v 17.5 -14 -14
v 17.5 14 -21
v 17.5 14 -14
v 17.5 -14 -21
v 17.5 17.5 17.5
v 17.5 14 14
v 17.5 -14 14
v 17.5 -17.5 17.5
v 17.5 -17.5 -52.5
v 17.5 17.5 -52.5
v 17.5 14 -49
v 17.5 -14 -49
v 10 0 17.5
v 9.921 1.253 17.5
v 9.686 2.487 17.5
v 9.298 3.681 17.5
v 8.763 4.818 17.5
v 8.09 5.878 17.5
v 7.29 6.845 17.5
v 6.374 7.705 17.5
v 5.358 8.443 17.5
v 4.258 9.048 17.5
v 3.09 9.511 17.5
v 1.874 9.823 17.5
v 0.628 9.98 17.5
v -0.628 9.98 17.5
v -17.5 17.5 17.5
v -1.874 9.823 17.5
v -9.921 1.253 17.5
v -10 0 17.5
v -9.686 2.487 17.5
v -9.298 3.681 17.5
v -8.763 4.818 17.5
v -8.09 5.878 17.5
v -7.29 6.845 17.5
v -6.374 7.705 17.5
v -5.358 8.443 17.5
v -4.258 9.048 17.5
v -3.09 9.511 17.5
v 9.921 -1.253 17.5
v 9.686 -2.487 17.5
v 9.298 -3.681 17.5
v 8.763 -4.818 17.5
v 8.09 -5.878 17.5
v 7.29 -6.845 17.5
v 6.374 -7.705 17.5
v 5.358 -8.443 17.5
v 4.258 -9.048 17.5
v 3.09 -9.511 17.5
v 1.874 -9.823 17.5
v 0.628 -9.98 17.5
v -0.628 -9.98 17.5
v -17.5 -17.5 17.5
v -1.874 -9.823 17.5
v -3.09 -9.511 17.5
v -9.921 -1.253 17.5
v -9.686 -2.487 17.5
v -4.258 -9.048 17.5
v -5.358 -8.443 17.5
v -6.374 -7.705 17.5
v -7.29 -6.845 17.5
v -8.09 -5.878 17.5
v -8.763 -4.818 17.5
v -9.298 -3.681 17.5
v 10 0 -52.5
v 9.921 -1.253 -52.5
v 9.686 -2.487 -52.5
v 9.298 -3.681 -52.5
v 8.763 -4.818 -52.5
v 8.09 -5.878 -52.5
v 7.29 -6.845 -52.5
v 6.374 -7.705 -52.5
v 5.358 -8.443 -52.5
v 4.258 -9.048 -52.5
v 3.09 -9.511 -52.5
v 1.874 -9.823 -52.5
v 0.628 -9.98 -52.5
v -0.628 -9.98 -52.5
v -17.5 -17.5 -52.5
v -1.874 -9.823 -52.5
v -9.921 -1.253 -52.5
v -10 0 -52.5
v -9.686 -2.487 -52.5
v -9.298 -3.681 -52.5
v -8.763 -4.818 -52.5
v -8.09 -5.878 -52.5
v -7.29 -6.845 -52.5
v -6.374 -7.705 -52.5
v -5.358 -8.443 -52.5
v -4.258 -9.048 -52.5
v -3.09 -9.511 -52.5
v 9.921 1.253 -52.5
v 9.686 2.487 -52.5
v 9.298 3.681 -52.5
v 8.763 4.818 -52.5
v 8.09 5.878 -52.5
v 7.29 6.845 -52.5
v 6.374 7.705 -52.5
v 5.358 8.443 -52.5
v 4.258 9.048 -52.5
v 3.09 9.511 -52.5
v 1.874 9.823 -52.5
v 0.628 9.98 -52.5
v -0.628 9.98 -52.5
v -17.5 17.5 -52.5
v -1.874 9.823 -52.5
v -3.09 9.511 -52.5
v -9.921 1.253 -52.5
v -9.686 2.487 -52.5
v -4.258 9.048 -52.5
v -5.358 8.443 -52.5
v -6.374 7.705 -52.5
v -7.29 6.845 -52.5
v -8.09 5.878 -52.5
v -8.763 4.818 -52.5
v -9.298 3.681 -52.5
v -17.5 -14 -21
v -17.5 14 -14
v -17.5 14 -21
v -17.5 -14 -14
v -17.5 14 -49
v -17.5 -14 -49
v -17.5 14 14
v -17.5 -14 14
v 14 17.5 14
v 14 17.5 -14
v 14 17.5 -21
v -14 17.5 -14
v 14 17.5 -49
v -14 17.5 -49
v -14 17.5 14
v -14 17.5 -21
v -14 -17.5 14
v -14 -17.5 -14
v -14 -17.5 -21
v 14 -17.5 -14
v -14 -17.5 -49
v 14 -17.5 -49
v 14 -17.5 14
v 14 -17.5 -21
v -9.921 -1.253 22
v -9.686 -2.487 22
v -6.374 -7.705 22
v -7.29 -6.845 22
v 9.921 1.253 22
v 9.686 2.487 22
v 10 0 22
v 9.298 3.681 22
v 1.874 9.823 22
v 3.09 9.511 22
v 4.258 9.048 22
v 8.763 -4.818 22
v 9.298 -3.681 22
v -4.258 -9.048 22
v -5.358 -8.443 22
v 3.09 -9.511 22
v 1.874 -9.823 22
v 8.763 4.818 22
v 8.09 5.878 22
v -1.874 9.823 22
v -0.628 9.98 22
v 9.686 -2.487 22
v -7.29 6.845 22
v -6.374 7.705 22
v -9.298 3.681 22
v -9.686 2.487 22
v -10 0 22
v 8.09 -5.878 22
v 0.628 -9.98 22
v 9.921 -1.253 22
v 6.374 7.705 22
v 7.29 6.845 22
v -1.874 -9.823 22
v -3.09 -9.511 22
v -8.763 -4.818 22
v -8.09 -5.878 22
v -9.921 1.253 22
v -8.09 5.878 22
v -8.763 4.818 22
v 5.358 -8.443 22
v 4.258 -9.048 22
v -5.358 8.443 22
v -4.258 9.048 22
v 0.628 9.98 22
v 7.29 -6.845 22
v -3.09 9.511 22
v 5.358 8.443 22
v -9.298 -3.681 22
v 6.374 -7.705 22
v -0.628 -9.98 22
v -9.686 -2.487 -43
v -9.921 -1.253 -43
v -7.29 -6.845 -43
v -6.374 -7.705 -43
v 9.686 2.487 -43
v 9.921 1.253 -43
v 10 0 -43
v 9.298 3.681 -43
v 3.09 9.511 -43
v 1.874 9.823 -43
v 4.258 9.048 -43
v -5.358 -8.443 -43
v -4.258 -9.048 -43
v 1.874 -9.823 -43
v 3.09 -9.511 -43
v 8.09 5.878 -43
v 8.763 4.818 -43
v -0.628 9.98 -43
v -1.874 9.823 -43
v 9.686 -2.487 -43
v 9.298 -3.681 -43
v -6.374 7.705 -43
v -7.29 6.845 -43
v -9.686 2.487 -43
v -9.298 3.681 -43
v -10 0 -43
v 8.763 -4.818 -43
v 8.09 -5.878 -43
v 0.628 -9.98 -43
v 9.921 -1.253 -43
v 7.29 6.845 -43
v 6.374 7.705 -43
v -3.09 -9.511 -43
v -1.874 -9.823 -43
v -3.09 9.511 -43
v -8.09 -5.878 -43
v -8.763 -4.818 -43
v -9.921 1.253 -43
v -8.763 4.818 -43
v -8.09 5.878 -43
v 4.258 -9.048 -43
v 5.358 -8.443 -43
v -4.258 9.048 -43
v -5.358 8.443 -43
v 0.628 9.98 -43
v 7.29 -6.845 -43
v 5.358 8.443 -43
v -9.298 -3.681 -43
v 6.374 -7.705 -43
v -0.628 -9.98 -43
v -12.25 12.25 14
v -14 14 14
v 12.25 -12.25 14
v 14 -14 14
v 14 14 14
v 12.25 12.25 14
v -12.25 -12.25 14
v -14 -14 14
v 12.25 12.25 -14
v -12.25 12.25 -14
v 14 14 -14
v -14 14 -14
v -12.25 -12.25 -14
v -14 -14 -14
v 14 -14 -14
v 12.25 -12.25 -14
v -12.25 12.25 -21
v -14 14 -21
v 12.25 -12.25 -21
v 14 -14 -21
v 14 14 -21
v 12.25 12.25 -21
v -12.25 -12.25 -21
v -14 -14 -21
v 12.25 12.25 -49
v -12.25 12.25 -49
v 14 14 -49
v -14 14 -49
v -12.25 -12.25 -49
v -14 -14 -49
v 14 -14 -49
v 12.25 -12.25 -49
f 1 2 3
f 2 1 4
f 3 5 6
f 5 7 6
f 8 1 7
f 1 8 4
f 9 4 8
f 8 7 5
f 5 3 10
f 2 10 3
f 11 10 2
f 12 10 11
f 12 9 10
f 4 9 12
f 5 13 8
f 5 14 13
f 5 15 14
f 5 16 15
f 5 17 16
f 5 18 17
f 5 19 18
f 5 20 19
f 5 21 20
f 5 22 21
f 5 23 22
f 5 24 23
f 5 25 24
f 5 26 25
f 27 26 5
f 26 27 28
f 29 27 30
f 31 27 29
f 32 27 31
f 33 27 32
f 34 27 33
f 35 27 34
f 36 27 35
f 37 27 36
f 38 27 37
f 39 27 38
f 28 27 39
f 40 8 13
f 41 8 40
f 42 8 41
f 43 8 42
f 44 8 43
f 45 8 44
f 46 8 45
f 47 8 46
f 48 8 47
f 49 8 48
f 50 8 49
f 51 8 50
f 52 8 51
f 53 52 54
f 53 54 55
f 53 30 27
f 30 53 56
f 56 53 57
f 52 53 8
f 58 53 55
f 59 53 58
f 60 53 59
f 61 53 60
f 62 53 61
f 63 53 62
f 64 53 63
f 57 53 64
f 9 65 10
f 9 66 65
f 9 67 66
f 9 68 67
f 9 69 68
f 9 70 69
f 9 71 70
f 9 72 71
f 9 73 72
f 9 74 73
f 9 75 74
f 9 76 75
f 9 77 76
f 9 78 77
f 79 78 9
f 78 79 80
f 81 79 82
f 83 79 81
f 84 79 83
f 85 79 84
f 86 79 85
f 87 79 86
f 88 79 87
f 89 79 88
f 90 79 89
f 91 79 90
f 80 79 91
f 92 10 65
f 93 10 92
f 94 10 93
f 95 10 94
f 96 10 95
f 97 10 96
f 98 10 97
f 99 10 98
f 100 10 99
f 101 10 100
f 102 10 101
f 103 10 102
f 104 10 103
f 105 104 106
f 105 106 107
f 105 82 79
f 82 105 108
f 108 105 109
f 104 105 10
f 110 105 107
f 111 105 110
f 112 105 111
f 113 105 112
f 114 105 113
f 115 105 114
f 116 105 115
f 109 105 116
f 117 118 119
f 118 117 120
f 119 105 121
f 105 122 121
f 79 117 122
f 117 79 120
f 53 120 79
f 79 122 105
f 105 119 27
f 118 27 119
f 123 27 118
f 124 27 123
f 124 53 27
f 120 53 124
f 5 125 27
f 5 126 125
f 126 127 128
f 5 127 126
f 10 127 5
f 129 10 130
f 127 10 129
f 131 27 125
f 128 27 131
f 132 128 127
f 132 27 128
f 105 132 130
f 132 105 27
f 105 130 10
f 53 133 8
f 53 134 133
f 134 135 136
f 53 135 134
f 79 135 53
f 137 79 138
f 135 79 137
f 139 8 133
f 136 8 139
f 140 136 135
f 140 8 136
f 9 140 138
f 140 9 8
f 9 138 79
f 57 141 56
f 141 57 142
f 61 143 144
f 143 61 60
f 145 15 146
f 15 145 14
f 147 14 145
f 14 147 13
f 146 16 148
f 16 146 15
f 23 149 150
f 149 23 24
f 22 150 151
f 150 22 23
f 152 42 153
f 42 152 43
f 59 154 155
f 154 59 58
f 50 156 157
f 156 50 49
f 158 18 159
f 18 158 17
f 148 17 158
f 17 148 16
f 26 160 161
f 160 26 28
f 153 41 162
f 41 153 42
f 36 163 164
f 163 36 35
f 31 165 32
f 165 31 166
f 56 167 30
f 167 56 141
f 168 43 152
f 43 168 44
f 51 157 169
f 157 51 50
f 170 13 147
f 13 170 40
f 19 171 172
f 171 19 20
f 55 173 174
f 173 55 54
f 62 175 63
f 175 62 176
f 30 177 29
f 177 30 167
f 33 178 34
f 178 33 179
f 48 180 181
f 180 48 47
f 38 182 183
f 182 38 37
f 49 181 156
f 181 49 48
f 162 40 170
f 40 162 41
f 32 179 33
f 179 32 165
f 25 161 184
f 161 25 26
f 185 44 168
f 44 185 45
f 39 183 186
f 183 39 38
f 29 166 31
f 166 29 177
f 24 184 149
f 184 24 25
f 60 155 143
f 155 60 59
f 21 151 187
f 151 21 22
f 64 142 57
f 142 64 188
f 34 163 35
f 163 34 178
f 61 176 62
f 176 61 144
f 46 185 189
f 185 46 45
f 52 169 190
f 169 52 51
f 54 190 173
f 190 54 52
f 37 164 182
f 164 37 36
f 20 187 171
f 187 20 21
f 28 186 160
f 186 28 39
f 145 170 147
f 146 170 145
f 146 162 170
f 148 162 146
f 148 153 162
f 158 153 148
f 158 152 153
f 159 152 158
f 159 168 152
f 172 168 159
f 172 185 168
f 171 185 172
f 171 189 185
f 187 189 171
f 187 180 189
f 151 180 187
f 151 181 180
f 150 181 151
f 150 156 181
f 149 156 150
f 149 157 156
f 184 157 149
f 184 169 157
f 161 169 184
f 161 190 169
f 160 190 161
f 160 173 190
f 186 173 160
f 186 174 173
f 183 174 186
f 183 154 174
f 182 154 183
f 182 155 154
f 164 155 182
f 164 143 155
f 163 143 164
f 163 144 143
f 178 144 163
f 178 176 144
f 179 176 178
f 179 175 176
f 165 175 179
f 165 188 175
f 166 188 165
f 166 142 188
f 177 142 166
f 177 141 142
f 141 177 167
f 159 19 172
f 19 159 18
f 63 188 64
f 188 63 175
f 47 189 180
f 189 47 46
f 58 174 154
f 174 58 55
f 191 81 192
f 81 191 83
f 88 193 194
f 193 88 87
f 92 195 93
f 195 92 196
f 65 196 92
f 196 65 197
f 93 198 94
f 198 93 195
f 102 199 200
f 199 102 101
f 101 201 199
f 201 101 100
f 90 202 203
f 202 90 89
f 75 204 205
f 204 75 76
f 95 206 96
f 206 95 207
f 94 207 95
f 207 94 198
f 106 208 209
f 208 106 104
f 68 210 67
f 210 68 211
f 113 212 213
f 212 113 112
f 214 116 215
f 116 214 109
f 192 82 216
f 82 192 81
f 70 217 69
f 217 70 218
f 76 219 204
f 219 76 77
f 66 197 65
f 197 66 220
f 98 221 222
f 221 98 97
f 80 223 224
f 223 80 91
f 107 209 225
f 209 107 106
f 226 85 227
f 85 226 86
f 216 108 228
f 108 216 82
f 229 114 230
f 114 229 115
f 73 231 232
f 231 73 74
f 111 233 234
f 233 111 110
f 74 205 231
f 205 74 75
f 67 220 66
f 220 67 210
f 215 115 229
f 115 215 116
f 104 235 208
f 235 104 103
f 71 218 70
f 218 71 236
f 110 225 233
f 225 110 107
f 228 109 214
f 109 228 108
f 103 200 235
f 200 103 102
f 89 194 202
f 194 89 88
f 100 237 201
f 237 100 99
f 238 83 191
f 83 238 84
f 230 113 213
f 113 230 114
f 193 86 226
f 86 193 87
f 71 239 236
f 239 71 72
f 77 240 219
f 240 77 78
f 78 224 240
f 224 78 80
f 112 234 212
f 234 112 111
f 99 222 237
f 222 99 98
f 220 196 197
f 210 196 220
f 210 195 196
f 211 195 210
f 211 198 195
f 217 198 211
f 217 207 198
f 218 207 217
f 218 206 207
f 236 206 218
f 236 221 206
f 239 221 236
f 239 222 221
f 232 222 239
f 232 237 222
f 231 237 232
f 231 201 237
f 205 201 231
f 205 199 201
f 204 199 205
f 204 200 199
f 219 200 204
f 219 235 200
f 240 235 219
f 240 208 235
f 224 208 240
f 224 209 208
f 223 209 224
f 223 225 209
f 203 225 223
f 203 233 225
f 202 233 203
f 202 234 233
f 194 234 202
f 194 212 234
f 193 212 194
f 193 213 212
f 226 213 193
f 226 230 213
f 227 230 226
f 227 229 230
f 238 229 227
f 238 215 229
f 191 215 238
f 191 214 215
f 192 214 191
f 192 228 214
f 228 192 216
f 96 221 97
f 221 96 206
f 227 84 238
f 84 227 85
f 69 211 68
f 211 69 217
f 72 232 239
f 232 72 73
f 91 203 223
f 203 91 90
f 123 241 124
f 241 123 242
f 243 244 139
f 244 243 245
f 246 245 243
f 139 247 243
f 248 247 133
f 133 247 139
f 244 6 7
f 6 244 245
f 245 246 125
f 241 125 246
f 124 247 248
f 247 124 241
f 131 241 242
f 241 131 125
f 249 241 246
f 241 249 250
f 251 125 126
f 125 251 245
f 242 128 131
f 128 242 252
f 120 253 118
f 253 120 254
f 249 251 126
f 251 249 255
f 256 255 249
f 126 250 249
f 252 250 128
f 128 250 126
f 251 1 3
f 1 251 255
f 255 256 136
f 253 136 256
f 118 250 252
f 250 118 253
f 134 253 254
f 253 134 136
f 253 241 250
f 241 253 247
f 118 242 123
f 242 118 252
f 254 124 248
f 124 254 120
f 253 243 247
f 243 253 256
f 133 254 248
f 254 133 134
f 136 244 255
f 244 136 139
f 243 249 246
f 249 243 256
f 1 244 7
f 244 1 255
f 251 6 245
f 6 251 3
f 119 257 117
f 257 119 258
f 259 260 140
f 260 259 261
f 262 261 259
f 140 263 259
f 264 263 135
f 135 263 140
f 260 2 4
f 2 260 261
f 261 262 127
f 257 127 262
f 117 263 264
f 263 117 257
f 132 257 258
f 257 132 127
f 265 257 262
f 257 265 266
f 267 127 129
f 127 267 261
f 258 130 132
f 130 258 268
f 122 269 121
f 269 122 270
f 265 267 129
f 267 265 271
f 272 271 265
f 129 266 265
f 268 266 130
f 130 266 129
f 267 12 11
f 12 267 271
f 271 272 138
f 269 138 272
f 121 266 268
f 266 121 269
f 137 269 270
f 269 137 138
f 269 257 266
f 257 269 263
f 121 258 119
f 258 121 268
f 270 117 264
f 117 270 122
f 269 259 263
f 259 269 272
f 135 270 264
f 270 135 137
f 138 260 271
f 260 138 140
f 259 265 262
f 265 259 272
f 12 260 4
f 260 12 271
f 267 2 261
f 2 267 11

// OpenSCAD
// file: modules.scad
offset = [0,8,0];
zoom = [0.8,0.8,1];

module white( filename, text)
{
    translate([0,4,0])   scale(zoom)
    rotate([180,0,-90]) 
    union(){ 
        translate([-14,-6.4,-2.5])   rotate([0,0,90])  linear_extrude(5)  text (text,font="bold",size=3.5); 
        intersection() 
        {    
            cube([35,35,5],center=true); 
            translate([1.5,0,2.6])   scale([0.14,0.14,-1])surface(file = filename, center = true); 
        } 
    } 

};

module black( filename, text)
{
    translate([0,4,0])   scale(zoom)
    rotate([180,0,-90]) 
    difference() 
    {    
        cube([35,35,5],center=true); 
        translate([1.5,0,2.6])    scale([0.14,0.14,-1]) surface(file = filename, center = true);
        translate([-14,-6.4,-2.5])   rotate([0,0,90])  linear_extrude(6)  text (text,font="bold",size=3.5);
    } 
}

module shape()
{
    translate([0,8,0])   scale(zoom) rotate([180,0,0]) 
    {
        rotate([0,0,90]) translate([5,0,0])  cube([35,35,5.5],center=true);  
        // use for help
//        linear_extrude(5)  translate([-9,-4,0])   text("B",size=20);
    }
}

module cube_appendix()
{
    difference()
    {
        union()
        {
            translate([0,0,1])
            {
                cube([35,35,35],center=true);
                 translate([0,0,7]) cylinder(r=10,h=30,center=true);
            }
        }
        translate([0,0,-24]) cylinder(r=10,h=30,center=true);
    }
}

module blue_stairs()
{
        union()
        {
            translate([0,0,1])cube([35,35,35],center=true);
            translate([0,0,-20.5])cube([35,35,9],center=true);            
            translate([-4.25,0,-29.5])cube([35-8.5,35,9],center=true);            
            translate([-8.5,0,-29.5-9])cube([35-17,35,9],center=true);            
            translate([-13,0,-29.5-17.5])cube([35-26,35,9],center=true);            

        }
}

module green_stairs()
{
        union()
        {
            translate([0,0,1+35/2])cube([35,35,70],center=true);
            translate([0,0,-20.5])cube([35,35,9],center=true);            
            translate([-4.25,0,-29.5])cube([35-8.5,35,9],center=true);            
            translate([-8.5,0,-29.5-9])cube([35-17,35,9],center=true);            
            translate([-13,0,-29.5-17.5])cube([35-26,35,9],center=true);            

        }
}

module support()
{
    difference()
    {
        translate([10,-1.5,-12])
        {
            difference()
            {
                cube([211,51.5,22],center=true);
                translate([0,0,17]) cube([211,40,20],center=true);
                
                
            }
        }
        translate([106-8,-2.5,-10])    cylinder(r=11,h=10,$fn=50);
        translate([70.6-8,-2.5,-10])    cylinder(r=11,h=10,$fn=50);
        translate([35.3-8,-2.5,-10])    cylinder(r=11,h=10,$fn=50);
        translate([-8,-2.5,-10])    cylinder(r=11,h=10,$fn=50);
        translate([-43,-2.5,-10])    cylinder(r=11,h=10,$fn=50);
        translate([-78,-2.5,-10])    cylinder(r=11,h=10,$fn=50);
    }
}

module tower()
{
    difference()
    {
        union()
        {
            translate([0,0,3-35/2])cube([35,35,70],center=true);
            translate([0,0,20])    cylinder(r=10,h=5,$fn=50);
        }
        translate([0,0,-50])    cylinder(r=10,h=10,$fn=50);
    }
}

module character()
{
    union()
    {
        translate([0,0,10])    cylinder(r1=13,r2=8,h=25,$fn=50);    
        translate([0,0,37.5])    
        {
            cylinder(r1=12,r2=1,h=5,$fn=50);
            scale([1,1,-1]) cylinder(r1=12,r2=1,h=5,$fn=50);
        }
        
        translate([0,0,50]) sphere(r=12,$fn=50);
    }    
}
// main file
include <modules.scad>
//
translate([0,0,-3]) difference()
{
    color([1,0,0])
    {
            tower();
    }
    translate([0,0,3])
    union() color([0,1,0])
    {
        translate([0,0,-35]) rotate([90,0,0])
        {
            translate([0,-4,-15])       shape();  
            rotate([0,90,0])   translate([0,-4,-15])              shape();  
            rotate([0,180,0])   translate([0,-4,-15])              shape();  
            rotate([0,270,0])   translate([0,-4,-15])              shape();  
        }
       
        rotate([90,0,0])
        {
            translate([0,-4,-15])       shape();  
            rotate([0,90,0])   translate([0,-4,-15])              shape();  
            rotate([0,180,0])   translate([0,-4,-15])              shape();  
            rotate([0,270,0])   translate([0,-4,-15])              shape();  
        }
    }
}
